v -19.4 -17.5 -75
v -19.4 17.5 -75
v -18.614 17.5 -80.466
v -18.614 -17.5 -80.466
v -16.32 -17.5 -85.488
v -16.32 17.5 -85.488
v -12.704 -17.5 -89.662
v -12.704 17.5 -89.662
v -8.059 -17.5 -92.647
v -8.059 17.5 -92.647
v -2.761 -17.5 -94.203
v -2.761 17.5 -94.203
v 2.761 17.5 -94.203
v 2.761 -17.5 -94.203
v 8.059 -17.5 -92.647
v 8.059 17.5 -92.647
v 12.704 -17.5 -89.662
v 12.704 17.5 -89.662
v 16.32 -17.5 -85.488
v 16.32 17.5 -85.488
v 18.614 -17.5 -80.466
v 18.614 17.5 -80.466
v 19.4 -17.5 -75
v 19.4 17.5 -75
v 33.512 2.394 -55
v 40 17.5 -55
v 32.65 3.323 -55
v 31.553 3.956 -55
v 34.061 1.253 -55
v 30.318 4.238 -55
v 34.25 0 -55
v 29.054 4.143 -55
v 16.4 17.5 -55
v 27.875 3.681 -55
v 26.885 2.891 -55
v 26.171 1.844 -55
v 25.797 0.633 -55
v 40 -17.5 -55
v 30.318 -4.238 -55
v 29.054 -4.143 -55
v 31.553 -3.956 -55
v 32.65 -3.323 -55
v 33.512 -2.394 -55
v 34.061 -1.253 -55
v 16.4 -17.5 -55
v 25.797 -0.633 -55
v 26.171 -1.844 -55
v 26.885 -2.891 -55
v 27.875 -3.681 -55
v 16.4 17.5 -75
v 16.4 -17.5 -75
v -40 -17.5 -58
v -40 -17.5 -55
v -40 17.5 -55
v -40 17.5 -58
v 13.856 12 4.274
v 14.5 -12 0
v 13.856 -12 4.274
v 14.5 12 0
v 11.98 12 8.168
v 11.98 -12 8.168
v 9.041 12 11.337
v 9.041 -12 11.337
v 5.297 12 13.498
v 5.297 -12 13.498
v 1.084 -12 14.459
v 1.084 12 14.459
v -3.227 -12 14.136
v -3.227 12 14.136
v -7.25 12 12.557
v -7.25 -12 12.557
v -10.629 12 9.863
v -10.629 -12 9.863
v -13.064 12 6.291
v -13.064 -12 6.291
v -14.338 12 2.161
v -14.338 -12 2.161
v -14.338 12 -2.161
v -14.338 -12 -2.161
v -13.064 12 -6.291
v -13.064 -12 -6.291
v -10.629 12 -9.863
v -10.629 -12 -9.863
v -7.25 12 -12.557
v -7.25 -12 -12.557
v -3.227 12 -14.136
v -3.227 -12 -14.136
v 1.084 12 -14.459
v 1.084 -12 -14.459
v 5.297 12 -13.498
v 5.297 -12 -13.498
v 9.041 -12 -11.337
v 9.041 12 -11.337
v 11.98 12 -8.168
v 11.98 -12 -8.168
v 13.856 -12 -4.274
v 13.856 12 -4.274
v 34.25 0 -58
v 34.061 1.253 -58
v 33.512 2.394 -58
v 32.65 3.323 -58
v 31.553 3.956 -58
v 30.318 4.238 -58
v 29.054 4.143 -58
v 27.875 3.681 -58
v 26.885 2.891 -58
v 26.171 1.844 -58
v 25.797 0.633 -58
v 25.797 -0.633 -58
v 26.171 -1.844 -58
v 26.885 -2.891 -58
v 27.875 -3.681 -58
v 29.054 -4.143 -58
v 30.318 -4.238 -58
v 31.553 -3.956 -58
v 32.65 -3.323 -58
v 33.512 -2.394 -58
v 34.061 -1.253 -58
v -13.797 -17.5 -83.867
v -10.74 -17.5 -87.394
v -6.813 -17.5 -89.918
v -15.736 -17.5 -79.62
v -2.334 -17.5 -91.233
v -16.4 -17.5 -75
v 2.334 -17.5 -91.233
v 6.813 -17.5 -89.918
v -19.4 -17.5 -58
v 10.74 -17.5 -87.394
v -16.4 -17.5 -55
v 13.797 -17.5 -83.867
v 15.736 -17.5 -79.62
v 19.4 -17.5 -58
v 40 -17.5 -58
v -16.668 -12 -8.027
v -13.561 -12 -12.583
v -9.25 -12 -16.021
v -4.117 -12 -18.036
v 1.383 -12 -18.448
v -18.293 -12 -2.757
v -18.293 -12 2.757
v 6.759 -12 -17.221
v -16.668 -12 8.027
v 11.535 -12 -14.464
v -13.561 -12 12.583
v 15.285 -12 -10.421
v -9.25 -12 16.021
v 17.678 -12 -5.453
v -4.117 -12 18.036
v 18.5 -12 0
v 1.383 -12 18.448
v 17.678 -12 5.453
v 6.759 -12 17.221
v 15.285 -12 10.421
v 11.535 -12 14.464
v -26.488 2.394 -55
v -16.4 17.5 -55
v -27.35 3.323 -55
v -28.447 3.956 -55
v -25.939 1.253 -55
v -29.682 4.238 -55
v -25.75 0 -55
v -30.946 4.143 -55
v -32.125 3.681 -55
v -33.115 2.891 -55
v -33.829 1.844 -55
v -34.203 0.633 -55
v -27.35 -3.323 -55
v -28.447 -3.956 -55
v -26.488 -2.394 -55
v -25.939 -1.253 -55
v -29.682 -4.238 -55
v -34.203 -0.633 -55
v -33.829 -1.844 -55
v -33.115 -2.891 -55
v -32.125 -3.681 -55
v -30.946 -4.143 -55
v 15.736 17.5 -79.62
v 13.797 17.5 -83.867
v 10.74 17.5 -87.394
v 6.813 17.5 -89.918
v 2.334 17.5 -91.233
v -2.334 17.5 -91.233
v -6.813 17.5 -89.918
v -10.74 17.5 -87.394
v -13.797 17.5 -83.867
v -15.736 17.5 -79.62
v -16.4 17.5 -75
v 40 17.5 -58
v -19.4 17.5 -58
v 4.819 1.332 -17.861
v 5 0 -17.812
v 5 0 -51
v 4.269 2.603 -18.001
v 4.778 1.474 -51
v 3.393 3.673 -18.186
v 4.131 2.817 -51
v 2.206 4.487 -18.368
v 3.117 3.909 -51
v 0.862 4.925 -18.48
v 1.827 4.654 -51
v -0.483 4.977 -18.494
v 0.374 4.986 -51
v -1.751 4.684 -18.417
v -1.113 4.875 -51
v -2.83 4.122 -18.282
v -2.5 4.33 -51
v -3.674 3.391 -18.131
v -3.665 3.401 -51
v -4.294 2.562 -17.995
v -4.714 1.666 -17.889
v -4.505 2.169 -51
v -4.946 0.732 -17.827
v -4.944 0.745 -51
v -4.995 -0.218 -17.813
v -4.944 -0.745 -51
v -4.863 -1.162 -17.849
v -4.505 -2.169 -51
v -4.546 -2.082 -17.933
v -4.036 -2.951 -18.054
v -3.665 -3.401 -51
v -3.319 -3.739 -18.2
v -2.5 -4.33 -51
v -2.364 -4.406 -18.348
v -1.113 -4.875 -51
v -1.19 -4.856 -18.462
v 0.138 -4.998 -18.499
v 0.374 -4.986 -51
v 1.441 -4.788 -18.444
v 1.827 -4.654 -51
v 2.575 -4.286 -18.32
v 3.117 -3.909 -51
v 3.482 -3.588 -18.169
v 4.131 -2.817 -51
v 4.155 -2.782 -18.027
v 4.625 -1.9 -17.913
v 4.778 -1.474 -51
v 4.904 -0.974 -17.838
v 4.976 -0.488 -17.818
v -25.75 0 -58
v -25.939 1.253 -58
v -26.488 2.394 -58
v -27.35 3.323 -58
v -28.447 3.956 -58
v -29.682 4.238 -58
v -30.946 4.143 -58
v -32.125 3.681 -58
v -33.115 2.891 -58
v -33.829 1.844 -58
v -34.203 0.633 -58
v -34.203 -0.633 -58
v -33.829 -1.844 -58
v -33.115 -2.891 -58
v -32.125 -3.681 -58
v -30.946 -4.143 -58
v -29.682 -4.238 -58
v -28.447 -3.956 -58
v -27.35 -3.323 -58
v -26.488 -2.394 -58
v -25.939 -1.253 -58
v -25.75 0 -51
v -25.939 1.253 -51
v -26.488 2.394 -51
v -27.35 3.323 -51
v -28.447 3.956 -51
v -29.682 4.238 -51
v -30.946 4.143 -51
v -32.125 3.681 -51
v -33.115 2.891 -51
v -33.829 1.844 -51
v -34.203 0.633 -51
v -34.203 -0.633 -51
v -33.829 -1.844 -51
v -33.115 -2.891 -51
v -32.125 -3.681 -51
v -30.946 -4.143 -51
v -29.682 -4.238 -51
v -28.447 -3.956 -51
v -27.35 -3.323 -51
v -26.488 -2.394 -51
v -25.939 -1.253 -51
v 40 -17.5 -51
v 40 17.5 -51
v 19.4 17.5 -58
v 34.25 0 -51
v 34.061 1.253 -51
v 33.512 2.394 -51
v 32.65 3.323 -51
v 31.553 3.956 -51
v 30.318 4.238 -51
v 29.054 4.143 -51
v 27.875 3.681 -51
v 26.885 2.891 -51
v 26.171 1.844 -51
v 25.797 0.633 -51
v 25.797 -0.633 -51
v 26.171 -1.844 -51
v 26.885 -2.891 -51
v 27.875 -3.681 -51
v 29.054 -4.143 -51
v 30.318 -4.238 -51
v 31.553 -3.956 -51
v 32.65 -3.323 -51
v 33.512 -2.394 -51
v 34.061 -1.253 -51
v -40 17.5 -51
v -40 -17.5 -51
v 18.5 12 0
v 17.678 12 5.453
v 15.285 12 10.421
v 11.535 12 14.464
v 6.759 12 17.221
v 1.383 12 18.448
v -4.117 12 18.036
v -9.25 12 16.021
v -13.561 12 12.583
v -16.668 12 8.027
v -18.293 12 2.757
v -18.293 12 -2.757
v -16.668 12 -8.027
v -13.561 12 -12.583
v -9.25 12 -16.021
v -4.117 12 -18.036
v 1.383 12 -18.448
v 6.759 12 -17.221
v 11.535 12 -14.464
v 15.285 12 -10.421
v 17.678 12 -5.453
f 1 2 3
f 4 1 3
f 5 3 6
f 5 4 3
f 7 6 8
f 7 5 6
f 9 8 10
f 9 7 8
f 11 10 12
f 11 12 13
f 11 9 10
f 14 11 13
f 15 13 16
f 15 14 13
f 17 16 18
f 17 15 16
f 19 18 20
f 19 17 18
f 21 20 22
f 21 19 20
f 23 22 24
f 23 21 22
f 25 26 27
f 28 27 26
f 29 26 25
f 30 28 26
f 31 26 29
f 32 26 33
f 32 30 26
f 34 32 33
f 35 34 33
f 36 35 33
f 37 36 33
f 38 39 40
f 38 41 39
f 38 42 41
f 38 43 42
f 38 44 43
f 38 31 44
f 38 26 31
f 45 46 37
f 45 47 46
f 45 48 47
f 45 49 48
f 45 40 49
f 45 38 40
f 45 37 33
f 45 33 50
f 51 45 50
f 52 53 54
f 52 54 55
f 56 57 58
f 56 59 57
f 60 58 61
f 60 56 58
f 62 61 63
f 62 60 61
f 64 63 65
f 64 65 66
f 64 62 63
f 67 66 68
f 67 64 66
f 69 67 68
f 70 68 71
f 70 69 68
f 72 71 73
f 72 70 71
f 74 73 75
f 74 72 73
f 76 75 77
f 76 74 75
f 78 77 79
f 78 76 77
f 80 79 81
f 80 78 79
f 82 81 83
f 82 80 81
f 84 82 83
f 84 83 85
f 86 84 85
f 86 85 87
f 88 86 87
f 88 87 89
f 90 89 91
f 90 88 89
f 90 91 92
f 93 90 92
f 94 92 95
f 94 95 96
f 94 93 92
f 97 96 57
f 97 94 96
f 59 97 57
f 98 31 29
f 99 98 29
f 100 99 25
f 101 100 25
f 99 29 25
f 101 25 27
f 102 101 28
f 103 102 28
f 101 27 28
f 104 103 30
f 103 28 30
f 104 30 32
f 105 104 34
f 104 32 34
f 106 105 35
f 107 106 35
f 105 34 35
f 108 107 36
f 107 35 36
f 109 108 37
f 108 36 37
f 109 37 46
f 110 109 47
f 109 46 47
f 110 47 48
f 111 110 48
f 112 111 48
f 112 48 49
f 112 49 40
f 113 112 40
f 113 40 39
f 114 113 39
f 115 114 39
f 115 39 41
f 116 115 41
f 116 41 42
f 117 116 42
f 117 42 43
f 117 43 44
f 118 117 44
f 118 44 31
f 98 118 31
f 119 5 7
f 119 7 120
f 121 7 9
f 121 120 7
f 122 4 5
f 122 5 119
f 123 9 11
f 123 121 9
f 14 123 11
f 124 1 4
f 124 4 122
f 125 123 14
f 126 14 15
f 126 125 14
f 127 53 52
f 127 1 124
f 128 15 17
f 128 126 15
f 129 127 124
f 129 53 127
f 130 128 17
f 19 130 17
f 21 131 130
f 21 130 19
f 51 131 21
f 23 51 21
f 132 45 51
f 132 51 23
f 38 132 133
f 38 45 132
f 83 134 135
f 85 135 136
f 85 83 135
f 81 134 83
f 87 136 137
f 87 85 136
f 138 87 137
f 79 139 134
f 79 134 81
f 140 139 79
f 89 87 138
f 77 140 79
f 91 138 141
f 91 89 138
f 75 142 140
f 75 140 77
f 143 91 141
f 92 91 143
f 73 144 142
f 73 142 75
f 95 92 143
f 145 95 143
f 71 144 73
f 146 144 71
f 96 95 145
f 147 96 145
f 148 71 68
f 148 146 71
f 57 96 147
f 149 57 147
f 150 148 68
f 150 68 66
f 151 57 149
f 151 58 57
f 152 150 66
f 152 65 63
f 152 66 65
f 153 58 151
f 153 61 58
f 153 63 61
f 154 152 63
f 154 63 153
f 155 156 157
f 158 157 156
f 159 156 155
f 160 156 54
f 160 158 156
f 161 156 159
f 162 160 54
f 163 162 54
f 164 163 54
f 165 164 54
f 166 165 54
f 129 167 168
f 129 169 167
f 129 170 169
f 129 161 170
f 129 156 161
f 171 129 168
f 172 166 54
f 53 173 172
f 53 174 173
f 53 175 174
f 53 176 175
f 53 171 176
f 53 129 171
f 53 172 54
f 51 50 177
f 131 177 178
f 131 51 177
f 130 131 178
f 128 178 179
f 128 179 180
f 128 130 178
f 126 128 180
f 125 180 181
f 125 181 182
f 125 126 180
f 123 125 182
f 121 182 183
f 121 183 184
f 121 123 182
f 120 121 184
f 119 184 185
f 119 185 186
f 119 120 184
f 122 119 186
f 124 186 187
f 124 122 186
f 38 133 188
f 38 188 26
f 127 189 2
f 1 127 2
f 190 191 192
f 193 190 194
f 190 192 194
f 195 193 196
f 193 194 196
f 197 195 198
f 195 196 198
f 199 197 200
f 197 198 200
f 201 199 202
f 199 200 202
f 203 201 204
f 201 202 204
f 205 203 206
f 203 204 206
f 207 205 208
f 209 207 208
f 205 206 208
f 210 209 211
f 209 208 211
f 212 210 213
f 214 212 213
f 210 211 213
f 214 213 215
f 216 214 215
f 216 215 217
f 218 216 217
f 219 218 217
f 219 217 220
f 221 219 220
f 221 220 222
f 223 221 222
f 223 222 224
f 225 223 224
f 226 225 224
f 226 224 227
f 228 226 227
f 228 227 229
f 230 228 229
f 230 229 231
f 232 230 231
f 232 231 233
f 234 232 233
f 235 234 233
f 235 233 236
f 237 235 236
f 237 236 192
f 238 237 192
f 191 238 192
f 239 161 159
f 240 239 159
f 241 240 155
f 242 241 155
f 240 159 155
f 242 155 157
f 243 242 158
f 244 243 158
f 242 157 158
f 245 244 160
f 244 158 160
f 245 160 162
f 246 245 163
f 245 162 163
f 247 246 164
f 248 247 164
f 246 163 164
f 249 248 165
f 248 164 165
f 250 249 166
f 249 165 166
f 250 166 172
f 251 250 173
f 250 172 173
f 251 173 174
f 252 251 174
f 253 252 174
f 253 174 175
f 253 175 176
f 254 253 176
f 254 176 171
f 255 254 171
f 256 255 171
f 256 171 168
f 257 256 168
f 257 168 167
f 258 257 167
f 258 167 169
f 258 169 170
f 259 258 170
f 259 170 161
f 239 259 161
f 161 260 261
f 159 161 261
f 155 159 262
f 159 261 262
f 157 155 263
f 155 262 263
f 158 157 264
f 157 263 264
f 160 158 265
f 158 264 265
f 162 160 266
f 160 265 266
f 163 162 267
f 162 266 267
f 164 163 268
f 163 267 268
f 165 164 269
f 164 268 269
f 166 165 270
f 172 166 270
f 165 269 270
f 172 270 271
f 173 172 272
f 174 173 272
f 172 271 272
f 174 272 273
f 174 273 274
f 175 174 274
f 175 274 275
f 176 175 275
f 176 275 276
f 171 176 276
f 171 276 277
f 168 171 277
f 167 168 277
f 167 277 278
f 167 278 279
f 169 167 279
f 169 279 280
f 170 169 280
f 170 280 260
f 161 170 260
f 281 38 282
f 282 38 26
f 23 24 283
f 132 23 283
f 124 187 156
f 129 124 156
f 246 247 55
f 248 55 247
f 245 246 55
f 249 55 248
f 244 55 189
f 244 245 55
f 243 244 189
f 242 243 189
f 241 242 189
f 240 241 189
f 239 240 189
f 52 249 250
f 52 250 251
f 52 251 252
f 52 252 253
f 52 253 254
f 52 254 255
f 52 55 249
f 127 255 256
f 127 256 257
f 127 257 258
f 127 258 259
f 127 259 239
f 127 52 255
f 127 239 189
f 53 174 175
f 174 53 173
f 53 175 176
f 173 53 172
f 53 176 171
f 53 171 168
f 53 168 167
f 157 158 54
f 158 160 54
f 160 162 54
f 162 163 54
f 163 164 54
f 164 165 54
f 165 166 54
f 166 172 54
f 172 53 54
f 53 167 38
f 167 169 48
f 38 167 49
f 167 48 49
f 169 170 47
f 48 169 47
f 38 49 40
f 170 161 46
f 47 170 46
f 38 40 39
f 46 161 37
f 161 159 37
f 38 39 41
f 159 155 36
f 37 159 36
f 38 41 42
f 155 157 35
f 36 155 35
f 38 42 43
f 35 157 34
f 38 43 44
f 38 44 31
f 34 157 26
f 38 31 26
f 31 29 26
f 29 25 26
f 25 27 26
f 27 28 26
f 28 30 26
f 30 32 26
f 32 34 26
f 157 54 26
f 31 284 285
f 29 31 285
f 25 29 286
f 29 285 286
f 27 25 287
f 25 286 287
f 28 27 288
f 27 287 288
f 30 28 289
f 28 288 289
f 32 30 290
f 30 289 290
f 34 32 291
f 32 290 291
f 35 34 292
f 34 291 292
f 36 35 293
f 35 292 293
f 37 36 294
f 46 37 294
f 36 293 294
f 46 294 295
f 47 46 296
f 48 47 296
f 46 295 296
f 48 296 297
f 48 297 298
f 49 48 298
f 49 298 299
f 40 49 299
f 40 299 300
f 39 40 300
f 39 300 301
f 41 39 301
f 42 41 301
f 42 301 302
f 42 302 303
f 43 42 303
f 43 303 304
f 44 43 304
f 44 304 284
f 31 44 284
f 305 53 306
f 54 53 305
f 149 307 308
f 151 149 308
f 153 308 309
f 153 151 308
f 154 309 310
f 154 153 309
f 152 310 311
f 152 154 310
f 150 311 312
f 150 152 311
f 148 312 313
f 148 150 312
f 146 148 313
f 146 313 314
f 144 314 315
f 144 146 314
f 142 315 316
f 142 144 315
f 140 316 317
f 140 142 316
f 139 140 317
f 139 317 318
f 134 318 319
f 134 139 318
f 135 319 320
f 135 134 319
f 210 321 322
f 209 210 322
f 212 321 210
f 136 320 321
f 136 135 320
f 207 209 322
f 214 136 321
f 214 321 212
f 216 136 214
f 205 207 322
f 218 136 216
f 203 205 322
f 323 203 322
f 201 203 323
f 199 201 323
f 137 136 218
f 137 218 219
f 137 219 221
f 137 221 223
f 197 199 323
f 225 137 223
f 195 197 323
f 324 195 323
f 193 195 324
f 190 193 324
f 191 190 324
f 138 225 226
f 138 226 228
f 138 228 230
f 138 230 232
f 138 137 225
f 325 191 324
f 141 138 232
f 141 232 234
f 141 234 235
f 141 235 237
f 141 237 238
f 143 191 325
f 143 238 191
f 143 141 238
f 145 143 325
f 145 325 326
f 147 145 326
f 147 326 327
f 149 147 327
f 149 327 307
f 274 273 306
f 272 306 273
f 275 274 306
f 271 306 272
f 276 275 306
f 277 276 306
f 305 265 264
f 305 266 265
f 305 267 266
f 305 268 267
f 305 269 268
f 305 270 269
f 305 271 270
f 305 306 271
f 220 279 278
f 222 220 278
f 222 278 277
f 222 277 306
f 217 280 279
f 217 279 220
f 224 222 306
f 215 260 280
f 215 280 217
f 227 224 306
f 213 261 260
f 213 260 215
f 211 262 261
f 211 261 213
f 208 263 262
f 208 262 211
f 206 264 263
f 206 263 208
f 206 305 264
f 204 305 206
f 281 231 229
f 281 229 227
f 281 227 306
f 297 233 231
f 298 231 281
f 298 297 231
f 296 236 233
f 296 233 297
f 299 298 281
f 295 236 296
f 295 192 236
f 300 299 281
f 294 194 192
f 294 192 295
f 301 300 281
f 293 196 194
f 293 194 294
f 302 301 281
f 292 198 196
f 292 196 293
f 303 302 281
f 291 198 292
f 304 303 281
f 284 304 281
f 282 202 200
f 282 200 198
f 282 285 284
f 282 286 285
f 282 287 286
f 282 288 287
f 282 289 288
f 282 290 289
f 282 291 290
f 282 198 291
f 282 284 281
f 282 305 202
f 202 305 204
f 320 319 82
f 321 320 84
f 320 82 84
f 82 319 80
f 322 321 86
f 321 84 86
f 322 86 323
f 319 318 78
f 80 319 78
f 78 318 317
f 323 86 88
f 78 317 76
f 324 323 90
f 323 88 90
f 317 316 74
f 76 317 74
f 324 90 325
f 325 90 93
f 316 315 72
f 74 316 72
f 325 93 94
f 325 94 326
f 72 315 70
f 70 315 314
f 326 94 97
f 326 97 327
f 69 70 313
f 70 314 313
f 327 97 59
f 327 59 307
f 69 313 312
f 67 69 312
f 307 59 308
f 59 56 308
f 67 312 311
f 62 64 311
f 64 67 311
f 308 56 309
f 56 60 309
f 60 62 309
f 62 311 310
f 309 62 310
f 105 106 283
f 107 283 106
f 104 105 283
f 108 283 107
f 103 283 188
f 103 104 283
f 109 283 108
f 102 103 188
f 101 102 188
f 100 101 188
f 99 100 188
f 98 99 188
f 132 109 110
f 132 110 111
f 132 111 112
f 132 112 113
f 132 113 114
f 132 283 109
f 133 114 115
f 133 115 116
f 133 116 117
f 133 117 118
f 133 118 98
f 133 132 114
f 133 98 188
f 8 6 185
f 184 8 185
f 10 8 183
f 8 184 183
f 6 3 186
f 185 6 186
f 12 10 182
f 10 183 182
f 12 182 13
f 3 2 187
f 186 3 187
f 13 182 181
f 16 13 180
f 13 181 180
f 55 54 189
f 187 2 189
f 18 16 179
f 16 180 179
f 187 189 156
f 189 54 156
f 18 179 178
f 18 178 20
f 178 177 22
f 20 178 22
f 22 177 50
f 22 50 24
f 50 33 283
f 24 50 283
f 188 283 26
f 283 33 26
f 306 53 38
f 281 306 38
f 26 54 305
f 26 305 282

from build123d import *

# Parameters (mm, degrees)
F0_R      = 18.5
F0_R_2    = 14.5
F1_DEPTH  = 12
F3_R      = 5
F5_W      = 80
F5_H      = 35
F6_DEPTH  = 4
F8_DEPTH  = 17.5
F9_R      = 4.25
F10_DEPTH = 25


with BuildPart() as f1:
    # F0 (on Front) → F1 (new body, symmetric)
    with BuildSketch(Plane.XZ):
        Circle(F0_R)
        Circle(F0_R_2, mode=Mode.SUBTRACT)
    extrude(amount=F1_DEPTH, both=True)

    # F3 (on offset) → F4 (join, up to the next surface of F1)
    with BuildSketch(Plane.XY.offset(-55)):
        Circle(F3_R)
    extrude(until=Until.NEXT)

    # F5 (on offset) → F6 (join)
    with BuildSketch(Plane.XY.offset(-55)):
        Rectangle(F5_W, F5_H)
    extrude(amount=F6_DEPTH)


with BuildPart() as f8:
    # F7 (on Front) → F8 (new body, symmetric)
    with BuildSketch(Plane.XZ):
        with BuildLine():
            ThreePointArc((16.4, -75), (0, -91.4), (-16.4, -75))
            Line((-16.4, -75), (-16.4, -55))
            Line((-16.4, -55), (-40, -55))
            Line((-40, -55), (-40, -58))
            Line((-40, -58), (-19.4, -58))
            Line((-19.4, -58), (-19.4, -75))
            ThreePointArc((-19.4, -75), (0, -94.4), (19.4, -75))
            Line((19.4, -75), (19.4, -58))
            Line((19.4, -58), (40, -58))
            Line((40, -58), (40, -55))
            Line((40, -55), (16.4, -55))
            Line((16.4, -55), (16.4, -75))
        make_face()
    extrude(amount=F8_DEPTH, both=True)


with BuildPart() as f10_tool:
    # F9 (on face) → F10 (new body)
    with BuildSketch(Plane.XY.offset(-51)):
        with Locations((-30, 0)):
            Circle(F9_R)
        with Locations((30, 0)):
            Circle(F9_R)
    extrude(amount=-F10_DEPTH)


with BuildPart() as f1_1:
    add(f1.part)

    # F10: cut by f10_tool
    add(f10_tool.part, mode=Mode.SUBTRACT)


with BuildPart() as f8_1:
    add(f8.part)

    # F10: cut by f10_tool
    add(f10_tool.part, mode=Mode.SUBTRACT)


solid = Compound([f1_1.part, f8_1.part])
